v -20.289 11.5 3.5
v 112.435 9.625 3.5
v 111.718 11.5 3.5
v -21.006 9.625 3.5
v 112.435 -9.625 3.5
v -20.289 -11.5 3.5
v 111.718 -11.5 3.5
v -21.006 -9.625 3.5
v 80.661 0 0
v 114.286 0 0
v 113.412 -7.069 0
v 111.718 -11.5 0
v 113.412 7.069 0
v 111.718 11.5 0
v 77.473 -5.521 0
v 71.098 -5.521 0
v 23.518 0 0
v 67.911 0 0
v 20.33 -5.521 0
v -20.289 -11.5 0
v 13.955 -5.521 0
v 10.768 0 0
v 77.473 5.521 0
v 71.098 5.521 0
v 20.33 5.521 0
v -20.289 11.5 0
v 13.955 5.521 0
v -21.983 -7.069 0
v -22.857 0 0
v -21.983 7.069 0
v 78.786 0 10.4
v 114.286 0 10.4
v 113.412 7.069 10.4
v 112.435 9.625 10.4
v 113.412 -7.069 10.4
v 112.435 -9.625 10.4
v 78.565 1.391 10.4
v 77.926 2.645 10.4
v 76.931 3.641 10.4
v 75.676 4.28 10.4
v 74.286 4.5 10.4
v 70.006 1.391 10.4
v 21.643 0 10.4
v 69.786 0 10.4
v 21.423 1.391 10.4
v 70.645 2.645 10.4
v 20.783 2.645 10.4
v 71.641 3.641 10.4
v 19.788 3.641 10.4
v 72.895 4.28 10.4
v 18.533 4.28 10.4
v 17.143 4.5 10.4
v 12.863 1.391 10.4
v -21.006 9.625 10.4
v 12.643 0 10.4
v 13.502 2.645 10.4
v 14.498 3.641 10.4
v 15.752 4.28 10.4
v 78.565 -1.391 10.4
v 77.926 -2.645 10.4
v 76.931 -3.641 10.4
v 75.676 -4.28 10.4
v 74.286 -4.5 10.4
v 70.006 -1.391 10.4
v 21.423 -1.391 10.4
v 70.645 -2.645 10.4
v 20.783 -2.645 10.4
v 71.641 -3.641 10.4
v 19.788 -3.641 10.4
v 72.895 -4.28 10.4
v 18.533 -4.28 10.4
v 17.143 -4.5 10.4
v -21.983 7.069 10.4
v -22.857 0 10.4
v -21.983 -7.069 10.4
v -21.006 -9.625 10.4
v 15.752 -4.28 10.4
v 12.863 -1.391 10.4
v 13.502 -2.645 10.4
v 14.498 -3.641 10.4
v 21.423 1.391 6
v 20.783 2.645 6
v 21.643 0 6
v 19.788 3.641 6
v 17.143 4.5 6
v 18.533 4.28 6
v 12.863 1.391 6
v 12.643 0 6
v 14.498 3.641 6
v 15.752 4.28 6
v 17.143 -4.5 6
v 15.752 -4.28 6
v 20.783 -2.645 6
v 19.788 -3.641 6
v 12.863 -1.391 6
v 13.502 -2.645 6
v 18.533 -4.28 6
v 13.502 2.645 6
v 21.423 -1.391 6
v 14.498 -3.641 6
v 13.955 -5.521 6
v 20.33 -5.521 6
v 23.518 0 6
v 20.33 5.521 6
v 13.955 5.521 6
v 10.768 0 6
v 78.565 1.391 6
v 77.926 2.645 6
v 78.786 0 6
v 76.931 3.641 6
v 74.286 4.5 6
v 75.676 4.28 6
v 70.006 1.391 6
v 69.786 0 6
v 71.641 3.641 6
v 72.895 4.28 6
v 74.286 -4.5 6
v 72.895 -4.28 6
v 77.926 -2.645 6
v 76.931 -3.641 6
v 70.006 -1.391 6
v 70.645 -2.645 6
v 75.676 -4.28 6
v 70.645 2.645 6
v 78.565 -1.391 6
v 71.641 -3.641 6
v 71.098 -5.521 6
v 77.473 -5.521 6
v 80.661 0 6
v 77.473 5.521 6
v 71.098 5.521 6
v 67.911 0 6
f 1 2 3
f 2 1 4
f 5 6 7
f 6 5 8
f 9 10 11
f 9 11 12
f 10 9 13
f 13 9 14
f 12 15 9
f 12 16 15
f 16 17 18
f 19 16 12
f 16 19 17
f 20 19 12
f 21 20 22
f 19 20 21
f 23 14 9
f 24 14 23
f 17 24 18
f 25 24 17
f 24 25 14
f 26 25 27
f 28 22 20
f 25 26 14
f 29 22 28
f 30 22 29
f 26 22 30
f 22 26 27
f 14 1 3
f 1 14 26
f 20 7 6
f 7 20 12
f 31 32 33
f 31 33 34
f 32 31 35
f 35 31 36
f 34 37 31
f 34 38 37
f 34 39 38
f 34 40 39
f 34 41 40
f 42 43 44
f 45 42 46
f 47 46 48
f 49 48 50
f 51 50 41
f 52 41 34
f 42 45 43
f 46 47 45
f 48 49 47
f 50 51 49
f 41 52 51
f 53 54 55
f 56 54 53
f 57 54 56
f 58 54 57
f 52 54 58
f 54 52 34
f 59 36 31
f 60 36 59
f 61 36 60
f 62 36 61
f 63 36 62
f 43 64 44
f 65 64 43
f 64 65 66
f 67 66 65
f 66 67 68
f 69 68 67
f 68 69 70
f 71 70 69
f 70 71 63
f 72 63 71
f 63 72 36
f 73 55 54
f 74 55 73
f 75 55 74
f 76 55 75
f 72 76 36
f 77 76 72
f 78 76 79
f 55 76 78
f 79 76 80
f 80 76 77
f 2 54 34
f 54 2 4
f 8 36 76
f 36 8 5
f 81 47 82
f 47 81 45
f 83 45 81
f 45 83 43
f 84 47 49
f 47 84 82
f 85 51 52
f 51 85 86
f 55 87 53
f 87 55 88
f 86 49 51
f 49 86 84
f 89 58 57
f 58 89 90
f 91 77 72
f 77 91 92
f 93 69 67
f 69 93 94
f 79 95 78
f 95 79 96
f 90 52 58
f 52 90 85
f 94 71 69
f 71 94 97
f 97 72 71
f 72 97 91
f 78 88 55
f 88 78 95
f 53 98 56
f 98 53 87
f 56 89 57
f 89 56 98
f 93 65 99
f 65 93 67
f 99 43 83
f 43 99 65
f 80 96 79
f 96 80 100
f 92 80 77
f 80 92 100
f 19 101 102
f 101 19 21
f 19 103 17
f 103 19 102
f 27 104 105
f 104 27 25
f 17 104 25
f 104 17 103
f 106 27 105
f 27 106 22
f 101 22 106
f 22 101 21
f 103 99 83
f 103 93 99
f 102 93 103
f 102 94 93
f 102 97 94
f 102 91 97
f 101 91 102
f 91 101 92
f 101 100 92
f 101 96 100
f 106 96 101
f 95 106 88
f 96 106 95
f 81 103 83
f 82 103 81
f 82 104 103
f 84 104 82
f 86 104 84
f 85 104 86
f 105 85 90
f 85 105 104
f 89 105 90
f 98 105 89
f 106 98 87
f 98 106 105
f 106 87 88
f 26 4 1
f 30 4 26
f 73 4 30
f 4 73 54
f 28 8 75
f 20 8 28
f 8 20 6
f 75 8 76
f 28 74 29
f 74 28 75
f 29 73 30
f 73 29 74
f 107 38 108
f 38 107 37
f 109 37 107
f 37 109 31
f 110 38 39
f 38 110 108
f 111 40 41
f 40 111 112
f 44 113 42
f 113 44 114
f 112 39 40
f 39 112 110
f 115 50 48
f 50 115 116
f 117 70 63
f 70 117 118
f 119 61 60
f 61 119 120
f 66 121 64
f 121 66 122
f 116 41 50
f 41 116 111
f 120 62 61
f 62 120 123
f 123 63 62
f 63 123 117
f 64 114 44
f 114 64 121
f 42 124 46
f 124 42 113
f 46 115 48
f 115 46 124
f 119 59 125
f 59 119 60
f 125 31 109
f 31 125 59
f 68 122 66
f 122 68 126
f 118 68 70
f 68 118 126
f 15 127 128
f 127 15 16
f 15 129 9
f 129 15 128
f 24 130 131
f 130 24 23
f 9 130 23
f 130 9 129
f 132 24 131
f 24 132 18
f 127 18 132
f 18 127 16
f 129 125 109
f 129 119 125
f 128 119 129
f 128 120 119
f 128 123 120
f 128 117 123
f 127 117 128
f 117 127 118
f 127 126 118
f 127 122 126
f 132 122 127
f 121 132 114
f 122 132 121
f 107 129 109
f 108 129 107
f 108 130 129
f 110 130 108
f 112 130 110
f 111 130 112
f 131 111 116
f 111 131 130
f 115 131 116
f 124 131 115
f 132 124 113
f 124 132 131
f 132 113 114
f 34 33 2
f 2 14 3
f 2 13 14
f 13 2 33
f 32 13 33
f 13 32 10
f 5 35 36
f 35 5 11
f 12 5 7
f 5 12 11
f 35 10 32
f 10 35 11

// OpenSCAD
// -------------------------------------
// Miter slot dimensions - Tool specific
//slot_width = 19.65;
// DeWalt 7491RS w/Elegoo Neptune2s, see README
slot_width = 19.25; // 19.25 Perfect;  19.2 - hair loose, 19.3 snug in a few spots
slot_height = 10.40; // total height

// T Groove dimensions for bottom of miter slot
groove_width = 23;
groove_height = 3.5;

// -------------------------------------
// Fastener holes - Nut + Bolt or Wood Screw

// 1/4"-20 Imperial Nut + Bolt
nut_width = 12.75;
nut_height = 6;
bolt_diameter = 6.9;

// #6 Imperial Wood Screw
screw_width = 9;
screw_height = 3.3;
screw_diameter = 4.5;

// =====================================

module tslot_segment(t, slot_length, bolt, groove, chain){
    translate([(-slot_length/2)+(slot_length*(t/1.4)), 0, 0])
    difference(){
    intersection(){
        difference(){
            union(){
                if (groove) {
                  // groove
                  translate([-slot_length/2, -groove_width/2, 0])
                  cube([slot_length, groove_width,groove_height], 0);

                  // slot
                  translate([-slot_length/2, -slot_width/2, groove_height])
                  cube([slot_length,slot_width,slot_height-groove_height], 0);
                }
                else  {
                  // slot
                  translate([-slot_length/2, -slot_width/2, 0])
                  cube([slot_length,slot_width,slot_height], 0);
                }

            }
            // bolt/screw cutout
            cylinder(h=slot_height + groove_height, d=screw_width, $fn=20);

            if (bolt) {
                // nut cutout
                cylinder(h=nut_height, d=nut_width, $fn=6);
            }
            else {
                // countersink screw head space
                cylinder(h=nut_height, d1=nut_width, d2=screw_width, $fn=20);
            }
        }

        // Round corner edges
        scale([1,.85,1])
        cylinder(h=slot_height, d=slot_length);
    }
    // end cutout for extensions
    if (chain) {
        scale([1,.85,1]) translate([slot_length*.96,0,0])
        cylinder(h=slot_height, d=slot_length, $fn=60);
    }
    }
}

module tslot(segments=1, slot_length=80, bolt=true, groove=true, chain=false) {
    for (i =[1:segments]){
        tslot_segment(i, slot_length, bolt, groove, chain);
    }
}


// how many segments long
segments=2;

// lengt of each segment
segment_length = 80;

// bolt (true) or countersink for wood screw (false)
bolt = true;

// inset bottom, groove to lock into miter slot, false for a drop-in runner
groove = true;

// chain: true to groove in end for multi-part longer runners
chain = false;

tslot(segments, segment_length, bolt, groove, chain);
